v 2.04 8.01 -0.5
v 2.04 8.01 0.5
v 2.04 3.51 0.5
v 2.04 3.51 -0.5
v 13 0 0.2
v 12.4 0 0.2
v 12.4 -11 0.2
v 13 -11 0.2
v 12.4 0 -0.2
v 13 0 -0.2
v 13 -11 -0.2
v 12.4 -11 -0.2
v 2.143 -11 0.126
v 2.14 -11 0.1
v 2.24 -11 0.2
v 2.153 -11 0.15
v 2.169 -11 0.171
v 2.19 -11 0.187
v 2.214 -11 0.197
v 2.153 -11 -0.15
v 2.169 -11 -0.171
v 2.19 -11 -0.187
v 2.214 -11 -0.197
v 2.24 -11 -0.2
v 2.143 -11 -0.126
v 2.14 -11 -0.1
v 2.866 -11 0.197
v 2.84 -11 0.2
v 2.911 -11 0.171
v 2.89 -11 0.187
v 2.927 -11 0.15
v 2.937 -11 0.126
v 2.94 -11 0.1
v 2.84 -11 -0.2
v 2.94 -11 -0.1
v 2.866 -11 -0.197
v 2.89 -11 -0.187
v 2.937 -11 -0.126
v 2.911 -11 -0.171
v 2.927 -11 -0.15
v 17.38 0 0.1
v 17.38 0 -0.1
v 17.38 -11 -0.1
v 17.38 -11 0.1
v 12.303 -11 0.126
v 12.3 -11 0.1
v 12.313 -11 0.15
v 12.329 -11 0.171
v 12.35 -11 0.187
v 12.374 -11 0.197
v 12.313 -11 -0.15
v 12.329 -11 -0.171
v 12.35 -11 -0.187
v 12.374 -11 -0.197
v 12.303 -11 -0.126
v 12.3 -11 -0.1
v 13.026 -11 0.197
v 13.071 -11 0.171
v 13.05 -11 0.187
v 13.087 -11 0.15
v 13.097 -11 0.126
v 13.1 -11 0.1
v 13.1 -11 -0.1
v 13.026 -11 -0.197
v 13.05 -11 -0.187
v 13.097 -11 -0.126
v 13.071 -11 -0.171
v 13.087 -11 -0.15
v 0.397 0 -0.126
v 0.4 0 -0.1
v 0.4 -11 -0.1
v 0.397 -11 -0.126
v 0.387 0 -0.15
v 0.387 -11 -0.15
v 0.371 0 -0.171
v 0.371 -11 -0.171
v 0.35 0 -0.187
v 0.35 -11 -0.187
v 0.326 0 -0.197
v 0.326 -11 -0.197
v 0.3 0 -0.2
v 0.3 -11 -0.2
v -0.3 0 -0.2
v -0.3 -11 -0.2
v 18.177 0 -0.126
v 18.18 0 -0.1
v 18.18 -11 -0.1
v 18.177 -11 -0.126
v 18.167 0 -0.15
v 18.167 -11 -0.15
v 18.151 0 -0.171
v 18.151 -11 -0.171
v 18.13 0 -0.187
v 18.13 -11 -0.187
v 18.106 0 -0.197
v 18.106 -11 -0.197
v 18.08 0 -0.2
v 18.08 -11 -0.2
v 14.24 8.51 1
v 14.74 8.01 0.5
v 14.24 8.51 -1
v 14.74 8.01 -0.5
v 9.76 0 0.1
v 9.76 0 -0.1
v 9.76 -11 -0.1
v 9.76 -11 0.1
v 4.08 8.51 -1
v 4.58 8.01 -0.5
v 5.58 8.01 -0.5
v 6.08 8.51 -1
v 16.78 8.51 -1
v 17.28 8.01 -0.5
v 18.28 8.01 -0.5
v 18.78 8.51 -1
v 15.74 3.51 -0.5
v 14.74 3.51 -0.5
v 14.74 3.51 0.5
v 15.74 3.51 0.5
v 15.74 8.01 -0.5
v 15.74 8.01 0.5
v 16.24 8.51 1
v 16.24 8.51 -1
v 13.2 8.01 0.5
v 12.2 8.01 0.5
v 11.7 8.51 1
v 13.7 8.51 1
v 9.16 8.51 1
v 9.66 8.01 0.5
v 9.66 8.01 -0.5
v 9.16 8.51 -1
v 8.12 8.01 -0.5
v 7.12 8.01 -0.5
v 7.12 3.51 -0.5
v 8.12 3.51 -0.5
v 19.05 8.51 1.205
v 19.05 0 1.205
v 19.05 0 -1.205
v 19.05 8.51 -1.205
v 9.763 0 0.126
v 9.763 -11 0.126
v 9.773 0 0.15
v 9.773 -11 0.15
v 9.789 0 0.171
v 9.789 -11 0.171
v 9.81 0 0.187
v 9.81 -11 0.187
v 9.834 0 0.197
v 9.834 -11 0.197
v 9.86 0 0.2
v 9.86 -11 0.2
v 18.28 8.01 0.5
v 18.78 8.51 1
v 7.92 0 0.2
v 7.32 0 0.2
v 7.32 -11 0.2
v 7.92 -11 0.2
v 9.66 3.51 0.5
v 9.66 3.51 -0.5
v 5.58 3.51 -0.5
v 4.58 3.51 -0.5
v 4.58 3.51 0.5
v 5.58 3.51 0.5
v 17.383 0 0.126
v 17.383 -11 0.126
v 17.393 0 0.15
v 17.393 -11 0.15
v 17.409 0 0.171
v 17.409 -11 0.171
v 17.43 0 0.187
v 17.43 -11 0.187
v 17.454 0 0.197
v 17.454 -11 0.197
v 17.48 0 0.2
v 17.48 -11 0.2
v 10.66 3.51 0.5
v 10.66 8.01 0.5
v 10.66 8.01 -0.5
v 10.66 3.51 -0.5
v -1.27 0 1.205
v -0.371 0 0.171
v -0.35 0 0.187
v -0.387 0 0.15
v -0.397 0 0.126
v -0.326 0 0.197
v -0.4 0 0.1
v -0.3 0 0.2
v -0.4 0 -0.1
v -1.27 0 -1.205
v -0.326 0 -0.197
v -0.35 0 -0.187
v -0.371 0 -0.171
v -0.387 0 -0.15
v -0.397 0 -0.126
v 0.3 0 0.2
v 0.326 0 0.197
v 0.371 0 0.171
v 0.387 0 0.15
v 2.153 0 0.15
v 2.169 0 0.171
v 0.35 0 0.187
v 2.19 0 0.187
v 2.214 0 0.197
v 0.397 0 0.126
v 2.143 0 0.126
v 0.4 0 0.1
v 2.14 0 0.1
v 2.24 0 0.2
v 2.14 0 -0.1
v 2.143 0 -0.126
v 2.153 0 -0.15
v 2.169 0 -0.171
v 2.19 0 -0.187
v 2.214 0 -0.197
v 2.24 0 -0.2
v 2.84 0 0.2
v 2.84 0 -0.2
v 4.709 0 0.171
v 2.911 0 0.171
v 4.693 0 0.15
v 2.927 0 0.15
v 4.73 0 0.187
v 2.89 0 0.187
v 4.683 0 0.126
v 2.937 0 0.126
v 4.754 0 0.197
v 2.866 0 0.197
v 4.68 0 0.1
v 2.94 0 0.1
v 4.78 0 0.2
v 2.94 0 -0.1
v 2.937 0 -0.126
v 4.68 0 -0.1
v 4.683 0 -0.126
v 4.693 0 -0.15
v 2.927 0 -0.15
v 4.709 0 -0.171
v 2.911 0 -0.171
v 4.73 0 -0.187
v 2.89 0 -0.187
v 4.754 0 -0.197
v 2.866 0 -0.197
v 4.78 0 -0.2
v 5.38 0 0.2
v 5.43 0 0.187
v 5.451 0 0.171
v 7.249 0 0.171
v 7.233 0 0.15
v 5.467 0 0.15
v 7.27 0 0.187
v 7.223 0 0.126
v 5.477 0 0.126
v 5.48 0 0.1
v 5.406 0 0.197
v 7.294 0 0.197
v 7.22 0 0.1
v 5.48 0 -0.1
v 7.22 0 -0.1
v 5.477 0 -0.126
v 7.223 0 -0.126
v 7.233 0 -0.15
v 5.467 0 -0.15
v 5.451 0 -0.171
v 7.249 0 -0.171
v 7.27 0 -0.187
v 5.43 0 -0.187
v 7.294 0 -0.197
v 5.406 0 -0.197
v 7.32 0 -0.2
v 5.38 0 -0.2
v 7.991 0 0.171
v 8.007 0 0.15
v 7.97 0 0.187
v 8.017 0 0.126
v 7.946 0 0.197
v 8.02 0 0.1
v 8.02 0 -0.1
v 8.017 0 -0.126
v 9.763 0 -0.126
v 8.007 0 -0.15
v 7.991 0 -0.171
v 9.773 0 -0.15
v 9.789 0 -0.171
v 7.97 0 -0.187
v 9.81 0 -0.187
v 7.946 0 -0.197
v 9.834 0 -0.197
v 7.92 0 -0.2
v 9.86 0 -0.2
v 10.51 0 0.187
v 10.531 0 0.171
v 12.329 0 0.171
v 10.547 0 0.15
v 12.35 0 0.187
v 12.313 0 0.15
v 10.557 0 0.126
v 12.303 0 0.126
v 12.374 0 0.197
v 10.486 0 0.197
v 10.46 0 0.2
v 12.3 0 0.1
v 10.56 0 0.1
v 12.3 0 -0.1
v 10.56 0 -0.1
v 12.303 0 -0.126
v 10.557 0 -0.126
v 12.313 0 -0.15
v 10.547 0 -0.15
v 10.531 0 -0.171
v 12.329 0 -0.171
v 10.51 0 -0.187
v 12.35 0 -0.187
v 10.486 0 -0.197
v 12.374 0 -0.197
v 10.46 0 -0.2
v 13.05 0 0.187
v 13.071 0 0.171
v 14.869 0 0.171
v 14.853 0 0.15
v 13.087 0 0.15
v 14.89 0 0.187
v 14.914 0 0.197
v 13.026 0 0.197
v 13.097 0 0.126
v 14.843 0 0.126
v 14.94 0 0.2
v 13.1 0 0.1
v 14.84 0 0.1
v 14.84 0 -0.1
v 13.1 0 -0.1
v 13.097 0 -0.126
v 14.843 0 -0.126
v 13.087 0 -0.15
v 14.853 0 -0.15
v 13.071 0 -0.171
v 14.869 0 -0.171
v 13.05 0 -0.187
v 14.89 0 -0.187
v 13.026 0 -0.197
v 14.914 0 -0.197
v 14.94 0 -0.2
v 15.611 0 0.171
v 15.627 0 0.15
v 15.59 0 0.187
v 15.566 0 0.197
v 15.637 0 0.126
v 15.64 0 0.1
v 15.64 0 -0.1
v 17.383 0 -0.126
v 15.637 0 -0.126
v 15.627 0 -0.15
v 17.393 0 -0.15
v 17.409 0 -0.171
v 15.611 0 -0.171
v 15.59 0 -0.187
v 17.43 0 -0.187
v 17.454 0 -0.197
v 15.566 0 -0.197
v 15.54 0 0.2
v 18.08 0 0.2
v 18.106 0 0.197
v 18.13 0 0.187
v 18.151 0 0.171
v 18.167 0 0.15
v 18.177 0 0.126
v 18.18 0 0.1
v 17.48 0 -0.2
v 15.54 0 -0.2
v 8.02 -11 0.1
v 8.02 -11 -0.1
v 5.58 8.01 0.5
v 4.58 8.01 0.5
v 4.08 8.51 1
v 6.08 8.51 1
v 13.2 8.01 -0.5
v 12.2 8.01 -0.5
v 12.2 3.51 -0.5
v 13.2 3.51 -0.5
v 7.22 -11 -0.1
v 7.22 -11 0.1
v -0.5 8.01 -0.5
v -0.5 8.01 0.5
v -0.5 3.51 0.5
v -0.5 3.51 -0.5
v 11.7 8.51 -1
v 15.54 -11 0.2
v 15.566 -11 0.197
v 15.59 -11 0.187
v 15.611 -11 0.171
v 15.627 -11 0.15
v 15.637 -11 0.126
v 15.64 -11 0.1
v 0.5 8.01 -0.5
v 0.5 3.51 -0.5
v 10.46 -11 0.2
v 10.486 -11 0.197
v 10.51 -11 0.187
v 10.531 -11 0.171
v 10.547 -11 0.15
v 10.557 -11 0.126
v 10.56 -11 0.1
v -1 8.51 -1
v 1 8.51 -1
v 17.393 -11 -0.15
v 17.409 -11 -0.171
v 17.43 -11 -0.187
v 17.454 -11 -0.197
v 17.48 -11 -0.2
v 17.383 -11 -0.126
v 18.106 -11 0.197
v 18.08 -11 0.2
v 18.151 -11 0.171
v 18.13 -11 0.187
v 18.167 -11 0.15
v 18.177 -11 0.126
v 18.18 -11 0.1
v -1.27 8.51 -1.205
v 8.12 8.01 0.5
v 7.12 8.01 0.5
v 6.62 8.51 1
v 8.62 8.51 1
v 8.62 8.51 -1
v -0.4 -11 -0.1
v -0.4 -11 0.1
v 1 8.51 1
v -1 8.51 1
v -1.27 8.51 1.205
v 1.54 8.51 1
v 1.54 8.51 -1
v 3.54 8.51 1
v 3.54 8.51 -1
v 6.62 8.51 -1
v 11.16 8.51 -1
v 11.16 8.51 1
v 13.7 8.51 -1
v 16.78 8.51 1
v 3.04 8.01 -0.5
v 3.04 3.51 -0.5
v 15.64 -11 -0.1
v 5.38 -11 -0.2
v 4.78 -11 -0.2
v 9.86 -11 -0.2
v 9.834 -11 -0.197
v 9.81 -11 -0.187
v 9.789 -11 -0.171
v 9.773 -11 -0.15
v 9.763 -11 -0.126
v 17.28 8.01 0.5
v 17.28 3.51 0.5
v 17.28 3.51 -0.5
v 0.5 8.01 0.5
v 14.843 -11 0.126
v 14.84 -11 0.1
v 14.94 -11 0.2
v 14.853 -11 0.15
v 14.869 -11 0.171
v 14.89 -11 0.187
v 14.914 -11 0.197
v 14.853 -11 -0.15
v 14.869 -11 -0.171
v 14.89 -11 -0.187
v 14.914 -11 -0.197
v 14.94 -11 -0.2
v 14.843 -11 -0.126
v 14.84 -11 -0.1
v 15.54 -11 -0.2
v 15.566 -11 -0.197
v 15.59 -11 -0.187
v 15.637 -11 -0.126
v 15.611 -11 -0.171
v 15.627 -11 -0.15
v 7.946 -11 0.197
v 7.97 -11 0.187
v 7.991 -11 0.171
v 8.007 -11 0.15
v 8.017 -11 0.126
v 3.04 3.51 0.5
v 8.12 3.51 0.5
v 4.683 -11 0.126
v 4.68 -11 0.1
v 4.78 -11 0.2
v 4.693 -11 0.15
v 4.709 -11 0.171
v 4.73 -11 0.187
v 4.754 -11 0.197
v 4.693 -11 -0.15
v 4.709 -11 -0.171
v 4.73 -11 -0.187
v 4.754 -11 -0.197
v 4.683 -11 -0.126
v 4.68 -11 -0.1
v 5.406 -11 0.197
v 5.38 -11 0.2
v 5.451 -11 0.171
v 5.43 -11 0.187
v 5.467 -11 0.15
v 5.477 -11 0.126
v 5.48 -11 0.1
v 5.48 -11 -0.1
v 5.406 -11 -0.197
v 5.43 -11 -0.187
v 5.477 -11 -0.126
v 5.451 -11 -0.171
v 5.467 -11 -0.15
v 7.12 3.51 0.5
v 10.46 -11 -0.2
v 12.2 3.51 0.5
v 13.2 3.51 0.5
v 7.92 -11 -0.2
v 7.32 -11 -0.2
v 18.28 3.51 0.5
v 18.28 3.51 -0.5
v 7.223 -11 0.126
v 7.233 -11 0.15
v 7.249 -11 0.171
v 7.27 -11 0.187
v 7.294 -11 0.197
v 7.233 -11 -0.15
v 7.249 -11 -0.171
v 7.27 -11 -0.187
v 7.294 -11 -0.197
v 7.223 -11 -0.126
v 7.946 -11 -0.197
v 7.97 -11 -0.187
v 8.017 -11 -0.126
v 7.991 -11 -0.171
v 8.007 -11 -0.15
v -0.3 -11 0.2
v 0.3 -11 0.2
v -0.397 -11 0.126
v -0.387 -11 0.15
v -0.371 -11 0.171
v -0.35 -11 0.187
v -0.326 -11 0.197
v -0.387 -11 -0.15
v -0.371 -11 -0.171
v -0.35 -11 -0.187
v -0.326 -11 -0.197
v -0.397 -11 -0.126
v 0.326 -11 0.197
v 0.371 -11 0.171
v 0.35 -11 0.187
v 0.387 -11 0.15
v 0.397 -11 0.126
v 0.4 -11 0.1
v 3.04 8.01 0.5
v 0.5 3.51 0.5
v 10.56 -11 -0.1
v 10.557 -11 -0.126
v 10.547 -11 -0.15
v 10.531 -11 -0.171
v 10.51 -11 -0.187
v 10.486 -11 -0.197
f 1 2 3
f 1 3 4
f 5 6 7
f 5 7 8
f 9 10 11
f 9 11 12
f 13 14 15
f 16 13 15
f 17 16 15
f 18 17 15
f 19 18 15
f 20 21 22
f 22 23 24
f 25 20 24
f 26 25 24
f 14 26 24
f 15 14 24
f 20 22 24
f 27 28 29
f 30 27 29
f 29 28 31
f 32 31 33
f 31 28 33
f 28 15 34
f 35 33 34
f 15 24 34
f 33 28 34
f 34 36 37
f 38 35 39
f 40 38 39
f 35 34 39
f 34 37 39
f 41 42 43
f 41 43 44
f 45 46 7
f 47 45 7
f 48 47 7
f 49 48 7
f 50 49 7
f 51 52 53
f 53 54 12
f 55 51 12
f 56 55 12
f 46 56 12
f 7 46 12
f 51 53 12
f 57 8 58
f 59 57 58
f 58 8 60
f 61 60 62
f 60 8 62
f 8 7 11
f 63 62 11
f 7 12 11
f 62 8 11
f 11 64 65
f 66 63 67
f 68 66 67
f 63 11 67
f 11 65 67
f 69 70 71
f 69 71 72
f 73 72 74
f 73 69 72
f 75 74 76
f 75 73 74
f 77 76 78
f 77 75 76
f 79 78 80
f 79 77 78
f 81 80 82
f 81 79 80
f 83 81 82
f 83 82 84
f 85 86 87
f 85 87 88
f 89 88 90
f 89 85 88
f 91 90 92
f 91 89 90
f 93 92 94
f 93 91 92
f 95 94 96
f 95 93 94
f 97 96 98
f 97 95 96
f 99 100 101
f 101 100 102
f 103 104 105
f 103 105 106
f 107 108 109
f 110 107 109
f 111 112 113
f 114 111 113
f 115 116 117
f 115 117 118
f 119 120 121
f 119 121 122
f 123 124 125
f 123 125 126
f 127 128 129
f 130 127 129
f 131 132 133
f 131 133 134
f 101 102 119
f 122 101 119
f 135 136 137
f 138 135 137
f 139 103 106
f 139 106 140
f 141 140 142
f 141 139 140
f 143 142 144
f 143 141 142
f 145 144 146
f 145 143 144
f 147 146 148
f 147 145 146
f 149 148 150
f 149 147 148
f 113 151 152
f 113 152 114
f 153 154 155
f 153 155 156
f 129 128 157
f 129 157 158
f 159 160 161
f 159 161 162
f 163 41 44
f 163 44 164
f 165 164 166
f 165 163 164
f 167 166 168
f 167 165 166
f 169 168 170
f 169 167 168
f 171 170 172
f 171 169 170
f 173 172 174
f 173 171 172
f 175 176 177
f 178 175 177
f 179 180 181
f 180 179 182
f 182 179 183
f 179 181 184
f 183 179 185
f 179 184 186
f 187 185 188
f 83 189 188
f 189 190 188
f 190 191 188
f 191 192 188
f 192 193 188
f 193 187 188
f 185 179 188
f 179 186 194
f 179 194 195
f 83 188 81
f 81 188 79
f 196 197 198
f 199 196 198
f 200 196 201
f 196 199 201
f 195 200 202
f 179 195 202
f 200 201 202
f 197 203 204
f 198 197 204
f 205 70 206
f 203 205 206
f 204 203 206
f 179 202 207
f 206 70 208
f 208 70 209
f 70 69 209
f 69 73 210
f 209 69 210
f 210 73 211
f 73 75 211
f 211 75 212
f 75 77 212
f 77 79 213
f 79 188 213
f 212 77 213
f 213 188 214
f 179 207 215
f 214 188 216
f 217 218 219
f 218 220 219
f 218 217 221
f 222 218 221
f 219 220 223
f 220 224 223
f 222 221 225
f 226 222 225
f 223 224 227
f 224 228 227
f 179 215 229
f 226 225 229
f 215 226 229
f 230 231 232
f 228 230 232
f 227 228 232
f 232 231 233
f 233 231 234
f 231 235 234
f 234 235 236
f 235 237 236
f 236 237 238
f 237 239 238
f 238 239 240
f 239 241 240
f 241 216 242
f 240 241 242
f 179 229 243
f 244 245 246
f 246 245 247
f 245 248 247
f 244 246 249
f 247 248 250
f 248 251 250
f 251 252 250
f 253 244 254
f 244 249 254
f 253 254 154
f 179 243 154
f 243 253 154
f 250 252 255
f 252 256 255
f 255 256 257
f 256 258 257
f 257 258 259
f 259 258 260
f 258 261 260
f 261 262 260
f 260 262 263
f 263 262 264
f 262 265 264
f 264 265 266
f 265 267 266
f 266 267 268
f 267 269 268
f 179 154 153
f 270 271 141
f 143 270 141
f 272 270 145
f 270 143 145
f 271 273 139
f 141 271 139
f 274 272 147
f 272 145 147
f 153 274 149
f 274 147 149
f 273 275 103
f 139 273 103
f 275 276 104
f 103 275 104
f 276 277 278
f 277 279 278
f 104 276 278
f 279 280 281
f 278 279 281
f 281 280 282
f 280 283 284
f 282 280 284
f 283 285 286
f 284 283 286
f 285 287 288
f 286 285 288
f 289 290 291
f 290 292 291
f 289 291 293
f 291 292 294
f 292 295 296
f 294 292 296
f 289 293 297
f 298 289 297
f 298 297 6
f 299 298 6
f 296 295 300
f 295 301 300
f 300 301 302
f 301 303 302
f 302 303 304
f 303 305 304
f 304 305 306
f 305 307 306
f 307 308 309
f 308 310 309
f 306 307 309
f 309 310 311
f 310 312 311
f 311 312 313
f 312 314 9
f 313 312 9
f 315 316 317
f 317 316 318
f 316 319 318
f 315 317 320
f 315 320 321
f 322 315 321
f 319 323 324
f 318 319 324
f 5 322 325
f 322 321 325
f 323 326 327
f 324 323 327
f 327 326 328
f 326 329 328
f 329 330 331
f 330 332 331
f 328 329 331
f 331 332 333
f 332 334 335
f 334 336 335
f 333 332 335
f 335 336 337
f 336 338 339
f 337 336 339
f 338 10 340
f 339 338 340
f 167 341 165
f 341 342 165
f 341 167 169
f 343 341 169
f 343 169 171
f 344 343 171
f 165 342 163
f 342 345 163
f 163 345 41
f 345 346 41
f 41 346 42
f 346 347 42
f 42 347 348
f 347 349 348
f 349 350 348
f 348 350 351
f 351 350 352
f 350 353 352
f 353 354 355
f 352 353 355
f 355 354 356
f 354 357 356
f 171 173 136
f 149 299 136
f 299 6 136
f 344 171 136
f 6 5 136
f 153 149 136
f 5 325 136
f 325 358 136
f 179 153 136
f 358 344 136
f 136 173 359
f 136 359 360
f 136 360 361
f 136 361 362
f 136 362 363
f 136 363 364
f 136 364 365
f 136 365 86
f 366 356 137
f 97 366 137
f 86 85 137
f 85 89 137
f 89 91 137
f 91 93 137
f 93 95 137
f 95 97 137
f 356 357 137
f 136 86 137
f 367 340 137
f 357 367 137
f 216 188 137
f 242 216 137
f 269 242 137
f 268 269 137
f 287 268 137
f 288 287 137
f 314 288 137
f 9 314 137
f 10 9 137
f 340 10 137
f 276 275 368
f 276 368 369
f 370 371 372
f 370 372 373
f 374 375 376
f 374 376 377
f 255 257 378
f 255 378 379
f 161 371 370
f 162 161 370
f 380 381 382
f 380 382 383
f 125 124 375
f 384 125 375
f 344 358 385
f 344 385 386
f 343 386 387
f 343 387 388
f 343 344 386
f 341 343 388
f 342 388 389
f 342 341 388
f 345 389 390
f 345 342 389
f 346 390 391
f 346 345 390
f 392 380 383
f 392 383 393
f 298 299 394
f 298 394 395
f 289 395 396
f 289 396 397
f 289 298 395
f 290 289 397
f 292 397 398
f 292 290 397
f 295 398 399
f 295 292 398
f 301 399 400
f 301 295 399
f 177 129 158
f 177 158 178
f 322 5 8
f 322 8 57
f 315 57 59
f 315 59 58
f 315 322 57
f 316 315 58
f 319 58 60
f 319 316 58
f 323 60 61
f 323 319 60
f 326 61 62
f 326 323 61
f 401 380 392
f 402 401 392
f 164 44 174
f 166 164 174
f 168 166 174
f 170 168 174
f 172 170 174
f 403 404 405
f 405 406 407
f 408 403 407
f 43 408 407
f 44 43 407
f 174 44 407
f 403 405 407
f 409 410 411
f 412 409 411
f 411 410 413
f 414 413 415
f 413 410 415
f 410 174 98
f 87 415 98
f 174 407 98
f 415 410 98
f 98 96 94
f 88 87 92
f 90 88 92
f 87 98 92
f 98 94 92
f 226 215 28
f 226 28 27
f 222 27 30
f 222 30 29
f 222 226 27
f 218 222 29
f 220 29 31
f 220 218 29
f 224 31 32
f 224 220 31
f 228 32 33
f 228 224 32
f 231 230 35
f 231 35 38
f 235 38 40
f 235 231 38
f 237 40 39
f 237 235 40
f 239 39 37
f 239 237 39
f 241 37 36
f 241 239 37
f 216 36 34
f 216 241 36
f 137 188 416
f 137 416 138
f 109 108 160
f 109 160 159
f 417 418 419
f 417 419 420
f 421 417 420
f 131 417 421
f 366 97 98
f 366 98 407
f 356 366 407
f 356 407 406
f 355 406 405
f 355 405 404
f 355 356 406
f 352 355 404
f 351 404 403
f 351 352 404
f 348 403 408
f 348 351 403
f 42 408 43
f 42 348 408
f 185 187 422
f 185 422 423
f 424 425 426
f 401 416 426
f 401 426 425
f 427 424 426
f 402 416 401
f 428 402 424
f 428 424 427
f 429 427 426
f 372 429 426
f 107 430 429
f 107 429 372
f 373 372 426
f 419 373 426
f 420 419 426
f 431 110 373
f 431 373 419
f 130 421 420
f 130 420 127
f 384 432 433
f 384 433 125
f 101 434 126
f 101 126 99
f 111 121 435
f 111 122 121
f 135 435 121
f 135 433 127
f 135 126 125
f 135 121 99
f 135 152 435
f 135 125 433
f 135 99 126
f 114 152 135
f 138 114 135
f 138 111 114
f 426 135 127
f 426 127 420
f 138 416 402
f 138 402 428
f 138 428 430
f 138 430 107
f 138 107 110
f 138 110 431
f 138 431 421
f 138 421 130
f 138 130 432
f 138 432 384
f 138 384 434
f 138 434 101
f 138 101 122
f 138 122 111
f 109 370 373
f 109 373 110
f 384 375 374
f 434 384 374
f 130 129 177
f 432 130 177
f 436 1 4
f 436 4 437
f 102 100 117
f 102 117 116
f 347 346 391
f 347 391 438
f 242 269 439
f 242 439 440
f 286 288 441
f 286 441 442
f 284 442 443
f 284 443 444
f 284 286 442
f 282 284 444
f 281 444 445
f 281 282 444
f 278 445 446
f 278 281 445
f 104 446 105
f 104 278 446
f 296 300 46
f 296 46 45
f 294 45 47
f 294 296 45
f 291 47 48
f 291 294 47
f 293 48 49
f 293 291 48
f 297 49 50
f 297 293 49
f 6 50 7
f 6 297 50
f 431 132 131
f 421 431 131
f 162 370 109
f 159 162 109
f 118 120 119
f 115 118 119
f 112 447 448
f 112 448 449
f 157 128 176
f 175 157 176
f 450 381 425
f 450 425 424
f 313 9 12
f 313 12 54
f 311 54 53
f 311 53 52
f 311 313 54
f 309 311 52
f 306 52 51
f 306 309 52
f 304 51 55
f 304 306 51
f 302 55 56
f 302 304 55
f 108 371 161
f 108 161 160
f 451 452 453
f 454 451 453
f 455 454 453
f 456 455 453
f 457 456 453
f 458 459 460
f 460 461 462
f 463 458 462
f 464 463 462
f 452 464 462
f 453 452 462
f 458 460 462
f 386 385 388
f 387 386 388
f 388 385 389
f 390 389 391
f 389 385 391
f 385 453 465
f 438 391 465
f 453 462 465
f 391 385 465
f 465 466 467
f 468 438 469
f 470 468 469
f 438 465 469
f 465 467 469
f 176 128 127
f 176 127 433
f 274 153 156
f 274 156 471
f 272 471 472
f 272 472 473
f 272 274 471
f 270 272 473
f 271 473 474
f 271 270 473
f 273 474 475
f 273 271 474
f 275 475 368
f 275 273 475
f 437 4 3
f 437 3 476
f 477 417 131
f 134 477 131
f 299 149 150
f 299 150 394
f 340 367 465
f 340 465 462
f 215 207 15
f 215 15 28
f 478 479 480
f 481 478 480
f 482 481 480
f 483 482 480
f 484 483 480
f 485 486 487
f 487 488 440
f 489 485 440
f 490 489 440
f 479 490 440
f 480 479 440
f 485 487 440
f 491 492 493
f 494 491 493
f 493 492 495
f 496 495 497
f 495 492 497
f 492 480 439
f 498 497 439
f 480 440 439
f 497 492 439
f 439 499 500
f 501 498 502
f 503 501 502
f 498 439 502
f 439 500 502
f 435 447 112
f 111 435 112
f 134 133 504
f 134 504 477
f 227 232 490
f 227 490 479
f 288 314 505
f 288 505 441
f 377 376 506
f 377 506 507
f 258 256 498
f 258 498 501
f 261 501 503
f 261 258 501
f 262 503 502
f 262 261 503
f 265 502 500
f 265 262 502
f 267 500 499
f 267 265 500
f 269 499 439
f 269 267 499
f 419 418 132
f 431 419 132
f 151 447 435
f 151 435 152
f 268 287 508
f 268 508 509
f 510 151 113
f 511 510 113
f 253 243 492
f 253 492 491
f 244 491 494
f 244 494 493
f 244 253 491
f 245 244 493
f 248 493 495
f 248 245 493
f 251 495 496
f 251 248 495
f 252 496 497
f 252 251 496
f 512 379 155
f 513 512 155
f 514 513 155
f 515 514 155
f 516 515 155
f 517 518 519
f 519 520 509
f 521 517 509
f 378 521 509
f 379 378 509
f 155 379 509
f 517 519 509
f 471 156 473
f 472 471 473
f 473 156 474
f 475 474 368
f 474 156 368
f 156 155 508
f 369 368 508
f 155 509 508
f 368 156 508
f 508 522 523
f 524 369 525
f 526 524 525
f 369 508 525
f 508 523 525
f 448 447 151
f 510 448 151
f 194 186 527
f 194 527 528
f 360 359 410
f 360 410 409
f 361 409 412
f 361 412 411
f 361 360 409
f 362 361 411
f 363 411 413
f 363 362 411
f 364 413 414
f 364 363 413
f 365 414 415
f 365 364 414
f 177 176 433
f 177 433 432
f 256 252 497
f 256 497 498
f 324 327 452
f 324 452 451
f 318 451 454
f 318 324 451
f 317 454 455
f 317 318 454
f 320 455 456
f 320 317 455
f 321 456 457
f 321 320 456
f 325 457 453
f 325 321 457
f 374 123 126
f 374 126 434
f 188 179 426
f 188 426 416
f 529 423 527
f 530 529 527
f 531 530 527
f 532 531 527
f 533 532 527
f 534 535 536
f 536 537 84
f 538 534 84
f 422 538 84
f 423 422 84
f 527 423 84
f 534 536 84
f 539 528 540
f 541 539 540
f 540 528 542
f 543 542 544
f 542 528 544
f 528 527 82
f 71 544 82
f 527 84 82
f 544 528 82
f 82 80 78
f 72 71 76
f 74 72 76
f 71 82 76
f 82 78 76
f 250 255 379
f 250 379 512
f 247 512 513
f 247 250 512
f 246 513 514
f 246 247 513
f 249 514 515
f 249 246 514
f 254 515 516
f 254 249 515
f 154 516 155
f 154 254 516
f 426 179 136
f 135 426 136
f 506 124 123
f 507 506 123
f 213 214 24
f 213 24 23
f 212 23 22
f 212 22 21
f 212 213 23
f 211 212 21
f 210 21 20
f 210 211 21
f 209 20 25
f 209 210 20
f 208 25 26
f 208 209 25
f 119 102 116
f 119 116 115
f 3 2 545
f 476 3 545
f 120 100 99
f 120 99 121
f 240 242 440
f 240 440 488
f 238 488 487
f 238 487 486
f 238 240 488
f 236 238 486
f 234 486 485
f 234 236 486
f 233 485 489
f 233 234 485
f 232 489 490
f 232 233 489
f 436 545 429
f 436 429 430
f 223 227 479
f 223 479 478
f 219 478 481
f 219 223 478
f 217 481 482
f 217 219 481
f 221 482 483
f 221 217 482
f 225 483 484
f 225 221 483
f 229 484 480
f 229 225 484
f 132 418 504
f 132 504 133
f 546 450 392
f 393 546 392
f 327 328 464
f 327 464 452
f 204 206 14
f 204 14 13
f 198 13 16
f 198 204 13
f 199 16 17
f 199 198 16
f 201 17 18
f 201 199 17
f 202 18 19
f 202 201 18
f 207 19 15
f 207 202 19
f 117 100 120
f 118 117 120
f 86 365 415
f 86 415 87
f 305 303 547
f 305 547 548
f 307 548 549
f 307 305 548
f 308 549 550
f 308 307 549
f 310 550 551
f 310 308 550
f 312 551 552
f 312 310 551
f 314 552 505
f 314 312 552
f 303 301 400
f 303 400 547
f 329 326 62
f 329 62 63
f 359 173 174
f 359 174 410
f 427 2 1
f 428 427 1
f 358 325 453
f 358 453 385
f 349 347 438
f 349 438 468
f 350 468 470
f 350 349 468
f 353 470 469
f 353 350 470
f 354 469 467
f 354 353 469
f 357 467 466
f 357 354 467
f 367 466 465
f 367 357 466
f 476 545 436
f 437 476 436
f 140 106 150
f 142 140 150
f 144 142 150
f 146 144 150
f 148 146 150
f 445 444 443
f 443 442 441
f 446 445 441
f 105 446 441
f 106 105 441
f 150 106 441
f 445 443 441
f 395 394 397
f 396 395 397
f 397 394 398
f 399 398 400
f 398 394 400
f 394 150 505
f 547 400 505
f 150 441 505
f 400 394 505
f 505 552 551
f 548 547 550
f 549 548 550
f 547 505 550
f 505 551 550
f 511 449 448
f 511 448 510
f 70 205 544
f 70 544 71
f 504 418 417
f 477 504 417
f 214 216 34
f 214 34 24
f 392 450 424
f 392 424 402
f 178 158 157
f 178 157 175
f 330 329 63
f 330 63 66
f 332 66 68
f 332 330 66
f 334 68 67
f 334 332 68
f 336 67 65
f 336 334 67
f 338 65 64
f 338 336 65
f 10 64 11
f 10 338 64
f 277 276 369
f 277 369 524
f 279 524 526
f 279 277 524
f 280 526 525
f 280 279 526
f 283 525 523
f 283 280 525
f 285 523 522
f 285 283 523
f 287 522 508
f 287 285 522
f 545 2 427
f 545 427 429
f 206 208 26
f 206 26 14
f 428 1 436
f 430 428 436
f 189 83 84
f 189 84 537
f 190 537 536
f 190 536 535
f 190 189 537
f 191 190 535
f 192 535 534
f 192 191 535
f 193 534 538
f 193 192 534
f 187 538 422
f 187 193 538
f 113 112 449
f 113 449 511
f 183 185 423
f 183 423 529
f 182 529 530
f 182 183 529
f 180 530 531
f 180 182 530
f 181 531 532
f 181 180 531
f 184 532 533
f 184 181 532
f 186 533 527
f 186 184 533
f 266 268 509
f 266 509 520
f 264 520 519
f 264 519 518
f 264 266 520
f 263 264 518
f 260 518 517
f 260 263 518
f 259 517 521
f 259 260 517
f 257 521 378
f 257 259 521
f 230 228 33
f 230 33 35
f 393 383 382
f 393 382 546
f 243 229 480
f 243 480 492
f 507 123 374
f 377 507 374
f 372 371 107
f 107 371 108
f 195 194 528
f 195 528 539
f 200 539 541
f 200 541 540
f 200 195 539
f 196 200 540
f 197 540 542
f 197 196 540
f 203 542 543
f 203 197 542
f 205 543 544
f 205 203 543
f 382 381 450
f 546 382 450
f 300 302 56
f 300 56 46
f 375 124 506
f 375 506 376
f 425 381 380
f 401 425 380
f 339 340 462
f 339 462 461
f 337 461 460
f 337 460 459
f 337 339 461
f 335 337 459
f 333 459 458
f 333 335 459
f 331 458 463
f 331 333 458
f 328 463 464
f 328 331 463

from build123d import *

# Parameters (mm, degrees)
SKETCH2_W                  = 20.32
SKETCH2_H                  = 2.41
BOSS_EXTRUDE1_DEPTH        = 8.51
SKETCH5_W                  = 1
SKETCH5_H                  = 1
CUT_EXTRUDE1_DEPTH         = 5
CHAMFER1_SIZE              = 0.5
LPATTERN3_COUNT            = 8
LPATTERN3_PITCH            = 2.54
CHAMFER1_OF_LPATTERN3_SIZE = 0.5
BOSS_EXTRUDE2_DEPTH        = 11
LPATTERN1_COUNT            = 8
LPATTERN1_PITCH            = 2.54


with BuildPart() as part:
    # Sketch2 → Boss-Extrude1 (new body)
    with BuildSketch(Plane(origin=(0, 0, 0), x_dir=(1, 0, 0), z_dir=(0, 1, 0))):
        with Locations((8.89, 0)):
            Rectangle(SKETCH2_W, SKETCH2_H)
    extrude(amount=BOSS_EXTRUDE1_DEPTH)

    # Sketch5 → Cut-Extrude1 (cut)
    with BuildSketch(Plane(origin=(0, 8.51, 0), x_dir=(1, 0, 0), z_dir=(0, 1, 0))):
        Rectangle(SKETCH5_W, SKETCH5_H)
    cut_extrude1 = extrude(amount=-CUT_EXTRUDE1_DEPTH, mode=Mode.SUBTRACT)

    # Chamfer1
    chamfer1_edges = [part.edges().sort_by_distance(p)[0] for p in [
        (0.5, 8.51, 0),
        (0, 8.51, -0.5),
        (-0.5, 8.51, 0),
        (0, 8.51, 0.5),
    ]]
    chamfer(chamfer1_edges, length=CHAMFER1_SIZE)

    # LPattern3: Cut-Extrude1 ×8
    with Locations(*[(i * LPATTERN3_PITCH, 0, 0) for i in range(1, LPATTERN3_COUNT)]):
        add(cut_extrude1, mode=Mode.SUBTRACT)

    # Chamfer1 of LPattern3
    chamfer1_of_lpattern3_edges = [part.edges().sort_by_distance(p)[0] for p in [
        (3.04, 8.51, 0),
        (2.54, 8.51, -0.5),
        (2.04, 8.51, 0),
        (2.54, 8.51, 0.5),
        (5.58, 8.51, 0),
        (5.08, 8.51, -0.5),
        (4.58, 8.51, 0),
        (5.08, 8.51, 0.5),
        (8.12, 8.51, 0),
        (7.62, 8.51, -0.5),
        (7.12, 8.51, 0),
        (7.62, 8.51, 0.5),
        (10.66, 8.51, 0),
        (10.16, 8.51, -0.5),
        (9.66, 8.51, 0),
        (10.16, 8.51, 0.5),
        (13.2, 8.51, 0),
        (12.7, 8.51, -0.5),
        (12.2, 8.51, 0),
        (12.7, 8.51, 0.5),
        (15.74, 8.51, 0),
        (15.24, 8.51, -0.5),
        (14.74, 8.51, 0),
        (15.24, 8.51, 0.5),
        (18.28, 8.51, 0),
        (17.78, 8.51, -0.5),
        (17.28, 8.51, 0),
        (17.78, 8.51, 0.5),
    ]]
    chamfer(chamfer1_of_lpattern3_edges, length=CHAMFER1_OF_LPATTERN3_SIZE)

    # Sketch8 → Boss-Extrude2 (add)
    with BuildSketch(Plane(origin=(0, 0, 0), x_dir=(1, 0, 0), z_dir=(0, 1, 0))):
        with BuildLine():
            Line((-0.3, -0.2), (0.3, -0.2))
            ThreePointArc((0.3, -0.2), (0.370710678, -0.170710678), (0.4, -0.1))
            Line((0.4, -0.1), (0.4, 0.1))
            ThreePointArc((0.4, 0.1), (0.370710678, 0.170710678), (0.3, 0.2))
            Line((0.3, 0.2), (-0.3, 0.2))
            ThreePointArc((-0.3, 0.2), (-0.370710678, 0.170710678), (-0.4, 0.1))
            Line((-0.4, 0.1), (-0.4, -0.1))
            ThreePointArc((-0.4, -0.1), (-0.370710678, -0.170710678), (-0.3, -0.2))
        make_face()
    boss_extrude2 = extrude(amount=-BOSS_EXTRUDE2_DEPTH)

    # LPattern1: Boss-Extrude2 ×8
    with Locations(*[(i * LPATTERN1_PITCH, 0, 0) for i in range(1, LPATTERN1_COUNT)]):
        add(boss_extrude2)


solid = part.part
